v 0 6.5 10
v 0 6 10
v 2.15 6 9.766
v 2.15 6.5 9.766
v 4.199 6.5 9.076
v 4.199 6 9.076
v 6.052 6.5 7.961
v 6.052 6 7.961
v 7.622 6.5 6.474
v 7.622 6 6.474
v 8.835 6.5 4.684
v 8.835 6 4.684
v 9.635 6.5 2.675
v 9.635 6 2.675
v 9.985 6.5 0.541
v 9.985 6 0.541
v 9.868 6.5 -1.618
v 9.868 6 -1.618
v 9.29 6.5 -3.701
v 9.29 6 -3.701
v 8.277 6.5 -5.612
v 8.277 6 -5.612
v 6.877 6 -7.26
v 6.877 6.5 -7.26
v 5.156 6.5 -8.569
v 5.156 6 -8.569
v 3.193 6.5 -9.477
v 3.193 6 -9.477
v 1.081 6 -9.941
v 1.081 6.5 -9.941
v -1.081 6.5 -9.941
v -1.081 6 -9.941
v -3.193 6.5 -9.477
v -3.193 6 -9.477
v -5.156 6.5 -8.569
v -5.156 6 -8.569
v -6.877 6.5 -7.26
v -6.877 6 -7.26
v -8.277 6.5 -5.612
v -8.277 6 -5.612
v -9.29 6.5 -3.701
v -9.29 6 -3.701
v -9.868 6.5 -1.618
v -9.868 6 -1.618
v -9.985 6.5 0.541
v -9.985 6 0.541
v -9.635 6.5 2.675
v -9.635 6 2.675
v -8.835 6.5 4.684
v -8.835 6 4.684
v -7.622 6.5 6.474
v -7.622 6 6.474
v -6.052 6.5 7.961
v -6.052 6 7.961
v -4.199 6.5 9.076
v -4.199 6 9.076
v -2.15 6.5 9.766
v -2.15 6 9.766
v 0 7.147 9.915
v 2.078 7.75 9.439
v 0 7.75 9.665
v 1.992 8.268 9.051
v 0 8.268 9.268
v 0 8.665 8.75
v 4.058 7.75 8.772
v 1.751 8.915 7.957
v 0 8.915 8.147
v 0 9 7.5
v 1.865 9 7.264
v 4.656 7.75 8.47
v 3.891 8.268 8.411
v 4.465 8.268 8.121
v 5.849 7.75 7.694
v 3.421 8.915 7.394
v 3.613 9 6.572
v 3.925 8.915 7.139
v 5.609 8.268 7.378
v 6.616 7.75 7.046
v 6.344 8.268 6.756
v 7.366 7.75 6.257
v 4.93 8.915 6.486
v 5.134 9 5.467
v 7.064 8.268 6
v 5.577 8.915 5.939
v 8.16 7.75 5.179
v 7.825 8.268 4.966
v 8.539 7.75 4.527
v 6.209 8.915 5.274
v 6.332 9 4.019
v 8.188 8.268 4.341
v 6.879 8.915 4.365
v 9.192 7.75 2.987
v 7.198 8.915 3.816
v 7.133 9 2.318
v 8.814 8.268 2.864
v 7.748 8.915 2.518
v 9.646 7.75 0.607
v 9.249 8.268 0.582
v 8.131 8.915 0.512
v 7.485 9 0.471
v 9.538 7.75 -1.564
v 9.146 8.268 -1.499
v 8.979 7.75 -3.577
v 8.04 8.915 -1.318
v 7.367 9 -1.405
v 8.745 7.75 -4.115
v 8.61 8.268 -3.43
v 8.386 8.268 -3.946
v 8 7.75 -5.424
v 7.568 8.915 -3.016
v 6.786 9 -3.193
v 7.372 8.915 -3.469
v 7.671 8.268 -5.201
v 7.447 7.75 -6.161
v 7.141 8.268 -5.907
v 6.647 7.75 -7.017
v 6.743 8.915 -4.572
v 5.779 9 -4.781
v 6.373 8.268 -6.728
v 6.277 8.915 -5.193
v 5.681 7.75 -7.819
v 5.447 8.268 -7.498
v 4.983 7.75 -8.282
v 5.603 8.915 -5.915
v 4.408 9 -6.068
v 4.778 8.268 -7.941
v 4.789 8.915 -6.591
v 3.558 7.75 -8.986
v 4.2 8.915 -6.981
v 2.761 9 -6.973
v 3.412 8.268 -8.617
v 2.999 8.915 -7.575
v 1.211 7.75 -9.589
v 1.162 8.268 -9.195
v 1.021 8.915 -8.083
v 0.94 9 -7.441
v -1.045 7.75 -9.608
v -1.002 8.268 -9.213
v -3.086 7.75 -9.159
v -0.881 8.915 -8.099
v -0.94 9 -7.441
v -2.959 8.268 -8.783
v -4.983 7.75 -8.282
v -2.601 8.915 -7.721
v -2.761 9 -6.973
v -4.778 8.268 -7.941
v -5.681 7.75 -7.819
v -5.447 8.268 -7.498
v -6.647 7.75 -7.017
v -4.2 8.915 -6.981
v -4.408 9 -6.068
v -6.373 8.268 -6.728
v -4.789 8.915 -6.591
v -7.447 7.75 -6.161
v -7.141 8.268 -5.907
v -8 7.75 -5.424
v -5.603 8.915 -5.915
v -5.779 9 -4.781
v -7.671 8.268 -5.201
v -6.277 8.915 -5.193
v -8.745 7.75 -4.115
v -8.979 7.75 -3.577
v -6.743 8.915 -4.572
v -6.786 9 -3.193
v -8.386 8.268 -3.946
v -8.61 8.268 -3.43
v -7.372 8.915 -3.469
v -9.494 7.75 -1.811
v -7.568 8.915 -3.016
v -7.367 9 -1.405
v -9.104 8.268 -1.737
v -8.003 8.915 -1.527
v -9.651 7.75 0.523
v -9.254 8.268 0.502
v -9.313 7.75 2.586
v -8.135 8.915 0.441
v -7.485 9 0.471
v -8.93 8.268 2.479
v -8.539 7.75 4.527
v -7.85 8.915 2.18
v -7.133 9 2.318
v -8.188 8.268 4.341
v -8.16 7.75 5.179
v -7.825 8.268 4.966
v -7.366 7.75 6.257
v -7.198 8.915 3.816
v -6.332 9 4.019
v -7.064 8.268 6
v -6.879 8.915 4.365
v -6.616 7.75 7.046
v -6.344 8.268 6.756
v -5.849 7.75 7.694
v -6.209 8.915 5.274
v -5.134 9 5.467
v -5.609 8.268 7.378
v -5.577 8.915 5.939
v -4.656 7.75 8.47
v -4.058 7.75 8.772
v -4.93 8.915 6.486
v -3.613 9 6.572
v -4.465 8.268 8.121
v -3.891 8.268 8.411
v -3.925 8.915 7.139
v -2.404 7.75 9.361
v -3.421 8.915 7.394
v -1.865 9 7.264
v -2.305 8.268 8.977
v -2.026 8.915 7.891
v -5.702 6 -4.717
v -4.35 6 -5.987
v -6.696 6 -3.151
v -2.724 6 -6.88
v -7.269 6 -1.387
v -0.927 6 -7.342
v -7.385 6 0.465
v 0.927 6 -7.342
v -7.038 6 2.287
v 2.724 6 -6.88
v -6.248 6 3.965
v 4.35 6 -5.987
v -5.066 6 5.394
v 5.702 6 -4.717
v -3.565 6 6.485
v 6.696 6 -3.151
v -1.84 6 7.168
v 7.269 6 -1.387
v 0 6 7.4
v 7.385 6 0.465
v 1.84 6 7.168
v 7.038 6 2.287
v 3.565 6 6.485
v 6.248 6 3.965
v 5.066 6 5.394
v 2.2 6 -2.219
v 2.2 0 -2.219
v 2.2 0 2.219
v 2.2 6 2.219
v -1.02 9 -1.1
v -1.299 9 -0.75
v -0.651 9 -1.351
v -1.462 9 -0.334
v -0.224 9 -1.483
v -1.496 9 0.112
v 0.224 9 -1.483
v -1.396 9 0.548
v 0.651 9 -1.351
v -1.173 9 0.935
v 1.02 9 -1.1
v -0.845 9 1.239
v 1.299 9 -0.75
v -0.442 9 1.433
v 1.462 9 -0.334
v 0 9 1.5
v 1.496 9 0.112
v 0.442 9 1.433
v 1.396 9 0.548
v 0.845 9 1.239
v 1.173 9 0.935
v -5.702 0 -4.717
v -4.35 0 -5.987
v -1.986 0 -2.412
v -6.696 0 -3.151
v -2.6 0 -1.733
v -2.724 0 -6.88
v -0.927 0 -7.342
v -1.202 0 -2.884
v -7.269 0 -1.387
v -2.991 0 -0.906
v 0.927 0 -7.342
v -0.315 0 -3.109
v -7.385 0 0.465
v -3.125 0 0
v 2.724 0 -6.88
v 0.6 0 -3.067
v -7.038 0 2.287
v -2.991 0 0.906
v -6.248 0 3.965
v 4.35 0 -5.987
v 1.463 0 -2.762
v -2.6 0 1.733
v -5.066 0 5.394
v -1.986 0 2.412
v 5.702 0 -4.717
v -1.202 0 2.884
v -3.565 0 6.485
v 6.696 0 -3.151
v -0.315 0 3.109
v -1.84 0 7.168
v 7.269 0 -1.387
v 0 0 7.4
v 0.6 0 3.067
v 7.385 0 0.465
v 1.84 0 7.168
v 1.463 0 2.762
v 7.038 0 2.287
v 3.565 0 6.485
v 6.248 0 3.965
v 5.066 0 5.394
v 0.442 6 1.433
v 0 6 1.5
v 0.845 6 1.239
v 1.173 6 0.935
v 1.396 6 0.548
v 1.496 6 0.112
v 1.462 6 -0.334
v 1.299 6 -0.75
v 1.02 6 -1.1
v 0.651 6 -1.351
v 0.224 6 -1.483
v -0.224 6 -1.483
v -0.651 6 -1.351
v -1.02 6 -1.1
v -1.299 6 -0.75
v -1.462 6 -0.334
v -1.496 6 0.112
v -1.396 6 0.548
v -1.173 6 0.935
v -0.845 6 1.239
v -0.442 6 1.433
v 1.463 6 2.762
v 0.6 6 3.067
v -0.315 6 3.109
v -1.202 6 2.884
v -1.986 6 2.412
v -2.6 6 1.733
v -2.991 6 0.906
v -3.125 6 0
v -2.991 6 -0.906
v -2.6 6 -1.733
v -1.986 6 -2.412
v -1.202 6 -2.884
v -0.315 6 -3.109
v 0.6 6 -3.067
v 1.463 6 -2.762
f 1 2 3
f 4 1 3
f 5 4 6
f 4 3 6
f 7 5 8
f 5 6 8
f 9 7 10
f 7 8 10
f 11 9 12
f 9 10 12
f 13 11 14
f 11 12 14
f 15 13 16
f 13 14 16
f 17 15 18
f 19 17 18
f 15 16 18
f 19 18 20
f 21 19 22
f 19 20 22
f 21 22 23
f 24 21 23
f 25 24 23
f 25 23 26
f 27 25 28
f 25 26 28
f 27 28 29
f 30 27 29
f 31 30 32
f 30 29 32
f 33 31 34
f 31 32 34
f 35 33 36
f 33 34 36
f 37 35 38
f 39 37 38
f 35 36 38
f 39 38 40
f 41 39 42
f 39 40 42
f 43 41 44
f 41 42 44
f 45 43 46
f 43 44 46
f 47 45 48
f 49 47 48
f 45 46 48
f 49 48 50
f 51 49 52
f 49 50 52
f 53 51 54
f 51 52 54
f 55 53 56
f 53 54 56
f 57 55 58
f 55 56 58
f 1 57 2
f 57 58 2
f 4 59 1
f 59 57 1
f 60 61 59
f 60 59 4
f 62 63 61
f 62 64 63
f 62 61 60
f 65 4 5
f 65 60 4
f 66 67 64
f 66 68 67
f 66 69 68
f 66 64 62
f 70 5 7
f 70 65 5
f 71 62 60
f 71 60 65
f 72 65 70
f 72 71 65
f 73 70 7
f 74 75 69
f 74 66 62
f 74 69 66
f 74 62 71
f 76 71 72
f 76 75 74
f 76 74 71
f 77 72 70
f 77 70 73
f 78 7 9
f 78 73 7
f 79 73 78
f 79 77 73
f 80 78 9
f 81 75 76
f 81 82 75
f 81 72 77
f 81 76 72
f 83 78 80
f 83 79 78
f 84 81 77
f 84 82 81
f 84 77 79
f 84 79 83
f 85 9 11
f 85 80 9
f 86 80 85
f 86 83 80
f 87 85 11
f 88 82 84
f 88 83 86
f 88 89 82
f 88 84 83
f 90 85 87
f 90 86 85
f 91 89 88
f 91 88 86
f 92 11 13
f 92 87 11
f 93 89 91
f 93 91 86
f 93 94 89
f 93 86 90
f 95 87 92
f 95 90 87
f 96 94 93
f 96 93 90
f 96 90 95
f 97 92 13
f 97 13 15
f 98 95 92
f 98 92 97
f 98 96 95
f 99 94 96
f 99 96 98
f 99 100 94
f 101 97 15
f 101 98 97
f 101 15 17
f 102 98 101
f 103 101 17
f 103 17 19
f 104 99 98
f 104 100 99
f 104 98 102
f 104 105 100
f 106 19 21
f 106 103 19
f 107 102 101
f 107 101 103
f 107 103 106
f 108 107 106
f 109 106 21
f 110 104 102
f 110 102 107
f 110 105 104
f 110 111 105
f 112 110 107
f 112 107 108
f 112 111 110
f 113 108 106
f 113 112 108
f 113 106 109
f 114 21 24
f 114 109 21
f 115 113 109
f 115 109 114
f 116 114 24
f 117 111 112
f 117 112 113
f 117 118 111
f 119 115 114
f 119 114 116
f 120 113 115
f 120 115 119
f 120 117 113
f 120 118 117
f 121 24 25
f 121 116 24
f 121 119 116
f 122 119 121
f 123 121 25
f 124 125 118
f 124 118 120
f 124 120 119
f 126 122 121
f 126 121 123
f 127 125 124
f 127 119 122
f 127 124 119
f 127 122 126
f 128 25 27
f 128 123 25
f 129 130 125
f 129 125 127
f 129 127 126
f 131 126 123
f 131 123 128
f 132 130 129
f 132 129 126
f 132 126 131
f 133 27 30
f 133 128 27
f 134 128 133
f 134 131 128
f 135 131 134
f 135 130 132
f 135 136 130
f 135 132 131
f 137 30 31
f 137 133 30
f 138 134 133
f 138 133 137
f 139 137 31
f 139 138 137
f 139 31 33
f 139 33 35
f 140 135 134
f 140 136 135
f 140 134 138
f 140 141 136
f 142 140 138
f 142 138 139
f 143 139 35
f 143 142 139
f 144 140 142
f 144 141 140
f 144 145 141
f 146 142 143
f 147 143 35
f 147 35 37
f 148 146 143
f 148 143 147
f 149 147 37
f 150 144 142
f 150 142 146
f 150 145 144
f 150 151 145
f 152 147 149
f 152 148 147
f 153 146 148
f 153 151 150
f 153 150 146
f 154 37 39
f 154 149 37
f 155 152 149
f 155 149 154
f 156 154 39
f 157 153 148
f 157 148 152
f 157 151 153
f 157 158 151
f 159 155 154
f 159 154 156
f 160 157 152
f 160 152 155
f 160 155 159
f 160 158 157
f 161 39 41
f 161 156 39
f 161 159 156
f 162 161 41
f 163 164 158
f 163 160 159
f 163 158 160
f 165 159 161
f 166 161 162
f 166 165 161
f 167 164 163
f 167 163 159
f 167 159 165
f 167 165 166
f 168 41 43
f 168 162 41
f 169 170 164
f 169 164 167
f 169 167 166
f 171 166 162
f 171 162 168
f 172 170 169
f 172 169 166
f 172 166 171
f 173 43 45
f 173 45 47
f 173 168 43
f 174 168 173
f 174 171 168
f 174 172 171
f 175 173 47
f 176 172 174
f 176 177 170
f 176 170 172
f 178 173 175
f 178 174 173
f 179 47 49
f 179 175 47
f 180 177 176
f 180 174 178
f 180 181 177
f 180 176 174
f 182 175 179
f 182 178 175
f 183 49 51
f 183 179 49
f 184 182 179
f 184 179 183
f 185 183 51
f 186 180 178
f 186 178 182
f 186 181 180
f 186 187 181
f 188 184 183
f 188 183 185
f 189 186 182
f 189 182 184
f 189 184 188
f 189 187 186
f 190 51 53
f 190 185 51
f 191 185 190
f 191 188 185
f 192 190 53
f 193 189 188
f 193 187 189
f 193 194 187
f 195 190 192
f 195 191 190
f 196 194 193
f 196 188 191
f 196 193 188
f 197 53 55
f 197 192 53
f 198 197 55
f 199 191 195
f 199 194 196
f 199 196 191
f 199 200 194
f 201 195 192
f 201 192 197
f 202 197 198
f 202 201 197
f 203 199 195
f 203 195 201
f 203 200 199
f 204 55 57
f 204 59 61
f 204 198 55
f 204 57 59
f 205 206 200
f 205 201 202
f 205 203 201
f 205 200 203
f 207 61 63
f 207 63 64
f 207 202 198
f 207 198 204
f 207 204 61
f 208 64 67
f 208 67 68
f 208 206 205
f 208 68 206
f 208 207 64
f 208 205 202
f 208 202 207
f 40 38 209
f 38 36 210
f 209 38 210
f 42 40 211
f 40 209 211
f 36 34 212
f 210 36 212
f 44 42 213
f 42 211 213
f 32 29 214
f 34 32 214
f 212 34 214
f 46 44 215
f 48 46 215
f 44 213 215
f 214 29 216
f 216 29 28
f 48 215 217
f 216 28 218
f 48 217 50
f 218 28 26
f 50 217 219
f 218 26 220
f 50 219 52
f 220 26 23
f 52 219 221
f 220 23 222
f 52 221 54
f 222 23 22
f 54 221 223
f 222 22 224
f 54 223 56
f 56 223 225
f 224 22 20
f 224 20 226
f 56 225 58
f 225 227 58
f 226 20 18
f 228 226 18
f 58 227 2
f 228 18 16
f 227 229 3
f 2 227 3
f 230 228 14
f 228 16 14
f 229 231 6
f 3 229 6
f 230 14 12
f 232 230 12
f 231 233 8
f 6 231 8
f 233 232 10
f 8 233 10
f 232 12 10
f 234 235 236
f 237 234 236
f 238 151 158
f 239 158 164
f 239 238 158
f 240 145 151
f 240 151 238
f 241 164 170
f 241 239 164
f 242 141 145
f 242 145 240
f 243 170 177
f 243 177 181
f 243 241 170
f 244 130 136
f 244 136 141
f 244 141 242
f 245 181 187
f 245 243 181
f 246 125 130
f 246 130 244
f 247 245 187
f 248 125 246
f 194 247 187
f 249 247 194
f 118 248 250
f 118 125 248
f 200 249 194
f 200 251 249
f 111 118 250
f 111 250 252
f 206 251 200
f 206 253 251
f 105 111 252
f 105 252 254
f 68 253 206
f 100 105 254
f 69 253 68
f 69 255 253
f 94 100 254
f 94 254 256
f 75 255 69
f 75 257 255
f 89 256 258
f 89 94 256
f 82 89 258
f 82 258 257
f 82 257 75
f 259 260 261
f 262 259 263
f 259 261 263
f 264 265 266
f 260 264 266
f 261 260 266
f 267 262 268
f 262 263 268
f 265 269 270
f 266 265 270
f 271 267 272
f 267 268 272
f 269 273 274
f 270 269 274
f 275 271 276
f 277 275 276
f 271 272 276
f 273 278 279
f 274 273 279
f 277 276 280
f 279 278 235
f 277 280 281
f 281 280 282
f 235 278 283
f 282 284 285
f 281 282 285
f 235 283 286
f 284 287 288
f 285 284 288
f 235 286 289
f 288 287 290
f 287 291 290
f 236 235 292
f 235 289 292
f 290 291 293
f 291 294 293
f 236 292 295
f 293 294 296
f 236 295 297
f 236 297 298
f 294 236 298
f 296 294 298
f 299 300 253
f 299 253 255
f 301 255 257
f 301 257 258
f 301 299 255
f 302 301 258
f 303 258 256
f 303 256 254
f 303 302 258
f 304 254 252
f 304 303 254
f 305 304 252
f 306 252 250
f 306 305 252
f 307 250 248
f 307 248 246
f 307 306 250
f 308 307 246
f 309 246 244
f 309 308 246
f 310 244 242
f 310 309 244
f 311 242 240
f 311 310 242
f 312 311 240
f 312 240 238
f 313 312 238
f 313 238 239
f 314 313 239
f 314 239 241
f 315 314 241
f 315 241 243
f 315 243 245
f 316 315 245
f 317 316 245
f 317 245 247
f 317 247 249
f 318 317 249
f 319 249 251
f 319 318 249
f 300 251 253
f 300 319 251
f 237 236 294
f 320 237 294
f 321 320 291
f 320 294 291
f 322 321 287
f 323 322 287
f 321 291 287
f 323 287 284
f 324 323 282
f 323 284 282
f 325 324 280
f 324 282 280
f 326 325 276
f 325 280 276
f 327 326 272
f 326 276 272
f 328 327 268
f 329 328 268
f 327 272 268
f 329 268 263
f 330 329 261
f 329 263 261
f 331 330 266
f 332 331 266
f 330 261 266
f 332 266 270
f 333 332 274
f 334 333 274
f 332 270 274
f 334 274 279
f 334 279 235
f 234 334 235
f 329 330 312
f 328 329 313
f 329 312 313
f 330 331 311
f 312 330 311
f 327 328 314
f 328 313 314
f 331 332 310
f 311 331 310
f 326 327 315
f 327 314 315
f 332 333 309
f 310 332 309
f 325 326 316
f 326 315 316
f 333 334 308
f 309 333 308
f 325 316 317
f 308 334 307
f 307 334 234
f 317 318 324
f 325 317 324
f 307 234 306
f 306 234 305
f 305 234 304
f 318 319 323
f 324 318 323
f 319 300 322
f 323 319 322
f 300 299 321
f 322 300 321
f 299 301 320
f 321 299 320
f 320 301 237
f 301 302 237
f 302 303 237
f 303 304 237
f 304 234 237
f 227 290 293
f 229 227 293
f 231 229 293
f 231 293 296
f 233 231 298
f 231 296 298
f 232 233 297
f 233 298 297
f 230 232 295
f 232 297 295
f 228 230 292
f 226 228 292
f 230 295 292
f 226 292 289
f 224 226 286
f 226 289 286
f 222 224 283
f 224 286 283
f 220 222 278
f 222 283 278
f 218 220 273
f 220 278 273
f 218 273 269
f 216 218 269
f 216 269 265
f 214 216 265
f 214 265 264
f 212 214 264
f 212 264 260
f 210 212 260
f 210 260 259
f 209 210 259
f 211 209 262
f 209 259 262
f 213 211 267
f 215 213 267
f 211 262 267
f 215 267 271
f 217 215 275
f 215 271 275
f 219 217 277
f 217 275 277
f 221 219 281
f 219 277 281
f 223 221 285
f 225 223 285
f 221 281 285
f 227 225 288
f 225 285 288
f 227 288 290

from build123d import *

# Parameters (mm, degrees)
SKETCH1_R           = 7.4
BOSS_EXTRUDE1_DEPTH = 6
SKETCH2_R           = 10
SKETCH2_R_2         = 1.5
BOSS_EXTRUDE2_DEPTH = 3
FILLET1_R           = 2.5


with BuildPart() as part:
    # Sketch1 → Boss-Extrude1 (new body)
    with BuildSketch(Plane(origin=(0, 0, 0), x_dir=(1, 0, 0), z_dir=(0, 1, 0))):
        with Locations(Location((0, 0, 0), (0, 0, 270))):
            Circle(SKETCH1_R)
        with BuildLine():
            Line((2.2, 2.219374912), (2.2, -2.219374912))
            ThreePointArc((2.2, -2.219374912), (-3.125, 0), (2.2, 2.219374912))
        make_face(mode=Mode.SUBTRACT)
    extrude(amount=BOSS_EXTRUDE1_DEPTH)

    # Sketch2 → Boss-Extrude2 (add)
    with BuildSketch(Plane(origin=(0, 6, 0), x_dir=(1, 0, 0), z_dir=(0, 1, 0))):
        with Locations(Location((0, 0, 0), (0, 0, 270))):
            Circle(SKETCH2_R)
        with Locations(Location((0, 0, 0), (0, 0, 270))):
            Circle(SKETCH2_R_2, mode=Mode.SUBTRACT)
    extrude(amount=BOSS_EXTRUDE2_DEPTH)

    # Fillet1
    fillet1_edges = [part.edges().sort_by_distance(p)[0] for p in [
        (0, 9, -10),
    ]]
    fillet(fillet1_edges, radius=FILLET1_R)


solid = part.part
